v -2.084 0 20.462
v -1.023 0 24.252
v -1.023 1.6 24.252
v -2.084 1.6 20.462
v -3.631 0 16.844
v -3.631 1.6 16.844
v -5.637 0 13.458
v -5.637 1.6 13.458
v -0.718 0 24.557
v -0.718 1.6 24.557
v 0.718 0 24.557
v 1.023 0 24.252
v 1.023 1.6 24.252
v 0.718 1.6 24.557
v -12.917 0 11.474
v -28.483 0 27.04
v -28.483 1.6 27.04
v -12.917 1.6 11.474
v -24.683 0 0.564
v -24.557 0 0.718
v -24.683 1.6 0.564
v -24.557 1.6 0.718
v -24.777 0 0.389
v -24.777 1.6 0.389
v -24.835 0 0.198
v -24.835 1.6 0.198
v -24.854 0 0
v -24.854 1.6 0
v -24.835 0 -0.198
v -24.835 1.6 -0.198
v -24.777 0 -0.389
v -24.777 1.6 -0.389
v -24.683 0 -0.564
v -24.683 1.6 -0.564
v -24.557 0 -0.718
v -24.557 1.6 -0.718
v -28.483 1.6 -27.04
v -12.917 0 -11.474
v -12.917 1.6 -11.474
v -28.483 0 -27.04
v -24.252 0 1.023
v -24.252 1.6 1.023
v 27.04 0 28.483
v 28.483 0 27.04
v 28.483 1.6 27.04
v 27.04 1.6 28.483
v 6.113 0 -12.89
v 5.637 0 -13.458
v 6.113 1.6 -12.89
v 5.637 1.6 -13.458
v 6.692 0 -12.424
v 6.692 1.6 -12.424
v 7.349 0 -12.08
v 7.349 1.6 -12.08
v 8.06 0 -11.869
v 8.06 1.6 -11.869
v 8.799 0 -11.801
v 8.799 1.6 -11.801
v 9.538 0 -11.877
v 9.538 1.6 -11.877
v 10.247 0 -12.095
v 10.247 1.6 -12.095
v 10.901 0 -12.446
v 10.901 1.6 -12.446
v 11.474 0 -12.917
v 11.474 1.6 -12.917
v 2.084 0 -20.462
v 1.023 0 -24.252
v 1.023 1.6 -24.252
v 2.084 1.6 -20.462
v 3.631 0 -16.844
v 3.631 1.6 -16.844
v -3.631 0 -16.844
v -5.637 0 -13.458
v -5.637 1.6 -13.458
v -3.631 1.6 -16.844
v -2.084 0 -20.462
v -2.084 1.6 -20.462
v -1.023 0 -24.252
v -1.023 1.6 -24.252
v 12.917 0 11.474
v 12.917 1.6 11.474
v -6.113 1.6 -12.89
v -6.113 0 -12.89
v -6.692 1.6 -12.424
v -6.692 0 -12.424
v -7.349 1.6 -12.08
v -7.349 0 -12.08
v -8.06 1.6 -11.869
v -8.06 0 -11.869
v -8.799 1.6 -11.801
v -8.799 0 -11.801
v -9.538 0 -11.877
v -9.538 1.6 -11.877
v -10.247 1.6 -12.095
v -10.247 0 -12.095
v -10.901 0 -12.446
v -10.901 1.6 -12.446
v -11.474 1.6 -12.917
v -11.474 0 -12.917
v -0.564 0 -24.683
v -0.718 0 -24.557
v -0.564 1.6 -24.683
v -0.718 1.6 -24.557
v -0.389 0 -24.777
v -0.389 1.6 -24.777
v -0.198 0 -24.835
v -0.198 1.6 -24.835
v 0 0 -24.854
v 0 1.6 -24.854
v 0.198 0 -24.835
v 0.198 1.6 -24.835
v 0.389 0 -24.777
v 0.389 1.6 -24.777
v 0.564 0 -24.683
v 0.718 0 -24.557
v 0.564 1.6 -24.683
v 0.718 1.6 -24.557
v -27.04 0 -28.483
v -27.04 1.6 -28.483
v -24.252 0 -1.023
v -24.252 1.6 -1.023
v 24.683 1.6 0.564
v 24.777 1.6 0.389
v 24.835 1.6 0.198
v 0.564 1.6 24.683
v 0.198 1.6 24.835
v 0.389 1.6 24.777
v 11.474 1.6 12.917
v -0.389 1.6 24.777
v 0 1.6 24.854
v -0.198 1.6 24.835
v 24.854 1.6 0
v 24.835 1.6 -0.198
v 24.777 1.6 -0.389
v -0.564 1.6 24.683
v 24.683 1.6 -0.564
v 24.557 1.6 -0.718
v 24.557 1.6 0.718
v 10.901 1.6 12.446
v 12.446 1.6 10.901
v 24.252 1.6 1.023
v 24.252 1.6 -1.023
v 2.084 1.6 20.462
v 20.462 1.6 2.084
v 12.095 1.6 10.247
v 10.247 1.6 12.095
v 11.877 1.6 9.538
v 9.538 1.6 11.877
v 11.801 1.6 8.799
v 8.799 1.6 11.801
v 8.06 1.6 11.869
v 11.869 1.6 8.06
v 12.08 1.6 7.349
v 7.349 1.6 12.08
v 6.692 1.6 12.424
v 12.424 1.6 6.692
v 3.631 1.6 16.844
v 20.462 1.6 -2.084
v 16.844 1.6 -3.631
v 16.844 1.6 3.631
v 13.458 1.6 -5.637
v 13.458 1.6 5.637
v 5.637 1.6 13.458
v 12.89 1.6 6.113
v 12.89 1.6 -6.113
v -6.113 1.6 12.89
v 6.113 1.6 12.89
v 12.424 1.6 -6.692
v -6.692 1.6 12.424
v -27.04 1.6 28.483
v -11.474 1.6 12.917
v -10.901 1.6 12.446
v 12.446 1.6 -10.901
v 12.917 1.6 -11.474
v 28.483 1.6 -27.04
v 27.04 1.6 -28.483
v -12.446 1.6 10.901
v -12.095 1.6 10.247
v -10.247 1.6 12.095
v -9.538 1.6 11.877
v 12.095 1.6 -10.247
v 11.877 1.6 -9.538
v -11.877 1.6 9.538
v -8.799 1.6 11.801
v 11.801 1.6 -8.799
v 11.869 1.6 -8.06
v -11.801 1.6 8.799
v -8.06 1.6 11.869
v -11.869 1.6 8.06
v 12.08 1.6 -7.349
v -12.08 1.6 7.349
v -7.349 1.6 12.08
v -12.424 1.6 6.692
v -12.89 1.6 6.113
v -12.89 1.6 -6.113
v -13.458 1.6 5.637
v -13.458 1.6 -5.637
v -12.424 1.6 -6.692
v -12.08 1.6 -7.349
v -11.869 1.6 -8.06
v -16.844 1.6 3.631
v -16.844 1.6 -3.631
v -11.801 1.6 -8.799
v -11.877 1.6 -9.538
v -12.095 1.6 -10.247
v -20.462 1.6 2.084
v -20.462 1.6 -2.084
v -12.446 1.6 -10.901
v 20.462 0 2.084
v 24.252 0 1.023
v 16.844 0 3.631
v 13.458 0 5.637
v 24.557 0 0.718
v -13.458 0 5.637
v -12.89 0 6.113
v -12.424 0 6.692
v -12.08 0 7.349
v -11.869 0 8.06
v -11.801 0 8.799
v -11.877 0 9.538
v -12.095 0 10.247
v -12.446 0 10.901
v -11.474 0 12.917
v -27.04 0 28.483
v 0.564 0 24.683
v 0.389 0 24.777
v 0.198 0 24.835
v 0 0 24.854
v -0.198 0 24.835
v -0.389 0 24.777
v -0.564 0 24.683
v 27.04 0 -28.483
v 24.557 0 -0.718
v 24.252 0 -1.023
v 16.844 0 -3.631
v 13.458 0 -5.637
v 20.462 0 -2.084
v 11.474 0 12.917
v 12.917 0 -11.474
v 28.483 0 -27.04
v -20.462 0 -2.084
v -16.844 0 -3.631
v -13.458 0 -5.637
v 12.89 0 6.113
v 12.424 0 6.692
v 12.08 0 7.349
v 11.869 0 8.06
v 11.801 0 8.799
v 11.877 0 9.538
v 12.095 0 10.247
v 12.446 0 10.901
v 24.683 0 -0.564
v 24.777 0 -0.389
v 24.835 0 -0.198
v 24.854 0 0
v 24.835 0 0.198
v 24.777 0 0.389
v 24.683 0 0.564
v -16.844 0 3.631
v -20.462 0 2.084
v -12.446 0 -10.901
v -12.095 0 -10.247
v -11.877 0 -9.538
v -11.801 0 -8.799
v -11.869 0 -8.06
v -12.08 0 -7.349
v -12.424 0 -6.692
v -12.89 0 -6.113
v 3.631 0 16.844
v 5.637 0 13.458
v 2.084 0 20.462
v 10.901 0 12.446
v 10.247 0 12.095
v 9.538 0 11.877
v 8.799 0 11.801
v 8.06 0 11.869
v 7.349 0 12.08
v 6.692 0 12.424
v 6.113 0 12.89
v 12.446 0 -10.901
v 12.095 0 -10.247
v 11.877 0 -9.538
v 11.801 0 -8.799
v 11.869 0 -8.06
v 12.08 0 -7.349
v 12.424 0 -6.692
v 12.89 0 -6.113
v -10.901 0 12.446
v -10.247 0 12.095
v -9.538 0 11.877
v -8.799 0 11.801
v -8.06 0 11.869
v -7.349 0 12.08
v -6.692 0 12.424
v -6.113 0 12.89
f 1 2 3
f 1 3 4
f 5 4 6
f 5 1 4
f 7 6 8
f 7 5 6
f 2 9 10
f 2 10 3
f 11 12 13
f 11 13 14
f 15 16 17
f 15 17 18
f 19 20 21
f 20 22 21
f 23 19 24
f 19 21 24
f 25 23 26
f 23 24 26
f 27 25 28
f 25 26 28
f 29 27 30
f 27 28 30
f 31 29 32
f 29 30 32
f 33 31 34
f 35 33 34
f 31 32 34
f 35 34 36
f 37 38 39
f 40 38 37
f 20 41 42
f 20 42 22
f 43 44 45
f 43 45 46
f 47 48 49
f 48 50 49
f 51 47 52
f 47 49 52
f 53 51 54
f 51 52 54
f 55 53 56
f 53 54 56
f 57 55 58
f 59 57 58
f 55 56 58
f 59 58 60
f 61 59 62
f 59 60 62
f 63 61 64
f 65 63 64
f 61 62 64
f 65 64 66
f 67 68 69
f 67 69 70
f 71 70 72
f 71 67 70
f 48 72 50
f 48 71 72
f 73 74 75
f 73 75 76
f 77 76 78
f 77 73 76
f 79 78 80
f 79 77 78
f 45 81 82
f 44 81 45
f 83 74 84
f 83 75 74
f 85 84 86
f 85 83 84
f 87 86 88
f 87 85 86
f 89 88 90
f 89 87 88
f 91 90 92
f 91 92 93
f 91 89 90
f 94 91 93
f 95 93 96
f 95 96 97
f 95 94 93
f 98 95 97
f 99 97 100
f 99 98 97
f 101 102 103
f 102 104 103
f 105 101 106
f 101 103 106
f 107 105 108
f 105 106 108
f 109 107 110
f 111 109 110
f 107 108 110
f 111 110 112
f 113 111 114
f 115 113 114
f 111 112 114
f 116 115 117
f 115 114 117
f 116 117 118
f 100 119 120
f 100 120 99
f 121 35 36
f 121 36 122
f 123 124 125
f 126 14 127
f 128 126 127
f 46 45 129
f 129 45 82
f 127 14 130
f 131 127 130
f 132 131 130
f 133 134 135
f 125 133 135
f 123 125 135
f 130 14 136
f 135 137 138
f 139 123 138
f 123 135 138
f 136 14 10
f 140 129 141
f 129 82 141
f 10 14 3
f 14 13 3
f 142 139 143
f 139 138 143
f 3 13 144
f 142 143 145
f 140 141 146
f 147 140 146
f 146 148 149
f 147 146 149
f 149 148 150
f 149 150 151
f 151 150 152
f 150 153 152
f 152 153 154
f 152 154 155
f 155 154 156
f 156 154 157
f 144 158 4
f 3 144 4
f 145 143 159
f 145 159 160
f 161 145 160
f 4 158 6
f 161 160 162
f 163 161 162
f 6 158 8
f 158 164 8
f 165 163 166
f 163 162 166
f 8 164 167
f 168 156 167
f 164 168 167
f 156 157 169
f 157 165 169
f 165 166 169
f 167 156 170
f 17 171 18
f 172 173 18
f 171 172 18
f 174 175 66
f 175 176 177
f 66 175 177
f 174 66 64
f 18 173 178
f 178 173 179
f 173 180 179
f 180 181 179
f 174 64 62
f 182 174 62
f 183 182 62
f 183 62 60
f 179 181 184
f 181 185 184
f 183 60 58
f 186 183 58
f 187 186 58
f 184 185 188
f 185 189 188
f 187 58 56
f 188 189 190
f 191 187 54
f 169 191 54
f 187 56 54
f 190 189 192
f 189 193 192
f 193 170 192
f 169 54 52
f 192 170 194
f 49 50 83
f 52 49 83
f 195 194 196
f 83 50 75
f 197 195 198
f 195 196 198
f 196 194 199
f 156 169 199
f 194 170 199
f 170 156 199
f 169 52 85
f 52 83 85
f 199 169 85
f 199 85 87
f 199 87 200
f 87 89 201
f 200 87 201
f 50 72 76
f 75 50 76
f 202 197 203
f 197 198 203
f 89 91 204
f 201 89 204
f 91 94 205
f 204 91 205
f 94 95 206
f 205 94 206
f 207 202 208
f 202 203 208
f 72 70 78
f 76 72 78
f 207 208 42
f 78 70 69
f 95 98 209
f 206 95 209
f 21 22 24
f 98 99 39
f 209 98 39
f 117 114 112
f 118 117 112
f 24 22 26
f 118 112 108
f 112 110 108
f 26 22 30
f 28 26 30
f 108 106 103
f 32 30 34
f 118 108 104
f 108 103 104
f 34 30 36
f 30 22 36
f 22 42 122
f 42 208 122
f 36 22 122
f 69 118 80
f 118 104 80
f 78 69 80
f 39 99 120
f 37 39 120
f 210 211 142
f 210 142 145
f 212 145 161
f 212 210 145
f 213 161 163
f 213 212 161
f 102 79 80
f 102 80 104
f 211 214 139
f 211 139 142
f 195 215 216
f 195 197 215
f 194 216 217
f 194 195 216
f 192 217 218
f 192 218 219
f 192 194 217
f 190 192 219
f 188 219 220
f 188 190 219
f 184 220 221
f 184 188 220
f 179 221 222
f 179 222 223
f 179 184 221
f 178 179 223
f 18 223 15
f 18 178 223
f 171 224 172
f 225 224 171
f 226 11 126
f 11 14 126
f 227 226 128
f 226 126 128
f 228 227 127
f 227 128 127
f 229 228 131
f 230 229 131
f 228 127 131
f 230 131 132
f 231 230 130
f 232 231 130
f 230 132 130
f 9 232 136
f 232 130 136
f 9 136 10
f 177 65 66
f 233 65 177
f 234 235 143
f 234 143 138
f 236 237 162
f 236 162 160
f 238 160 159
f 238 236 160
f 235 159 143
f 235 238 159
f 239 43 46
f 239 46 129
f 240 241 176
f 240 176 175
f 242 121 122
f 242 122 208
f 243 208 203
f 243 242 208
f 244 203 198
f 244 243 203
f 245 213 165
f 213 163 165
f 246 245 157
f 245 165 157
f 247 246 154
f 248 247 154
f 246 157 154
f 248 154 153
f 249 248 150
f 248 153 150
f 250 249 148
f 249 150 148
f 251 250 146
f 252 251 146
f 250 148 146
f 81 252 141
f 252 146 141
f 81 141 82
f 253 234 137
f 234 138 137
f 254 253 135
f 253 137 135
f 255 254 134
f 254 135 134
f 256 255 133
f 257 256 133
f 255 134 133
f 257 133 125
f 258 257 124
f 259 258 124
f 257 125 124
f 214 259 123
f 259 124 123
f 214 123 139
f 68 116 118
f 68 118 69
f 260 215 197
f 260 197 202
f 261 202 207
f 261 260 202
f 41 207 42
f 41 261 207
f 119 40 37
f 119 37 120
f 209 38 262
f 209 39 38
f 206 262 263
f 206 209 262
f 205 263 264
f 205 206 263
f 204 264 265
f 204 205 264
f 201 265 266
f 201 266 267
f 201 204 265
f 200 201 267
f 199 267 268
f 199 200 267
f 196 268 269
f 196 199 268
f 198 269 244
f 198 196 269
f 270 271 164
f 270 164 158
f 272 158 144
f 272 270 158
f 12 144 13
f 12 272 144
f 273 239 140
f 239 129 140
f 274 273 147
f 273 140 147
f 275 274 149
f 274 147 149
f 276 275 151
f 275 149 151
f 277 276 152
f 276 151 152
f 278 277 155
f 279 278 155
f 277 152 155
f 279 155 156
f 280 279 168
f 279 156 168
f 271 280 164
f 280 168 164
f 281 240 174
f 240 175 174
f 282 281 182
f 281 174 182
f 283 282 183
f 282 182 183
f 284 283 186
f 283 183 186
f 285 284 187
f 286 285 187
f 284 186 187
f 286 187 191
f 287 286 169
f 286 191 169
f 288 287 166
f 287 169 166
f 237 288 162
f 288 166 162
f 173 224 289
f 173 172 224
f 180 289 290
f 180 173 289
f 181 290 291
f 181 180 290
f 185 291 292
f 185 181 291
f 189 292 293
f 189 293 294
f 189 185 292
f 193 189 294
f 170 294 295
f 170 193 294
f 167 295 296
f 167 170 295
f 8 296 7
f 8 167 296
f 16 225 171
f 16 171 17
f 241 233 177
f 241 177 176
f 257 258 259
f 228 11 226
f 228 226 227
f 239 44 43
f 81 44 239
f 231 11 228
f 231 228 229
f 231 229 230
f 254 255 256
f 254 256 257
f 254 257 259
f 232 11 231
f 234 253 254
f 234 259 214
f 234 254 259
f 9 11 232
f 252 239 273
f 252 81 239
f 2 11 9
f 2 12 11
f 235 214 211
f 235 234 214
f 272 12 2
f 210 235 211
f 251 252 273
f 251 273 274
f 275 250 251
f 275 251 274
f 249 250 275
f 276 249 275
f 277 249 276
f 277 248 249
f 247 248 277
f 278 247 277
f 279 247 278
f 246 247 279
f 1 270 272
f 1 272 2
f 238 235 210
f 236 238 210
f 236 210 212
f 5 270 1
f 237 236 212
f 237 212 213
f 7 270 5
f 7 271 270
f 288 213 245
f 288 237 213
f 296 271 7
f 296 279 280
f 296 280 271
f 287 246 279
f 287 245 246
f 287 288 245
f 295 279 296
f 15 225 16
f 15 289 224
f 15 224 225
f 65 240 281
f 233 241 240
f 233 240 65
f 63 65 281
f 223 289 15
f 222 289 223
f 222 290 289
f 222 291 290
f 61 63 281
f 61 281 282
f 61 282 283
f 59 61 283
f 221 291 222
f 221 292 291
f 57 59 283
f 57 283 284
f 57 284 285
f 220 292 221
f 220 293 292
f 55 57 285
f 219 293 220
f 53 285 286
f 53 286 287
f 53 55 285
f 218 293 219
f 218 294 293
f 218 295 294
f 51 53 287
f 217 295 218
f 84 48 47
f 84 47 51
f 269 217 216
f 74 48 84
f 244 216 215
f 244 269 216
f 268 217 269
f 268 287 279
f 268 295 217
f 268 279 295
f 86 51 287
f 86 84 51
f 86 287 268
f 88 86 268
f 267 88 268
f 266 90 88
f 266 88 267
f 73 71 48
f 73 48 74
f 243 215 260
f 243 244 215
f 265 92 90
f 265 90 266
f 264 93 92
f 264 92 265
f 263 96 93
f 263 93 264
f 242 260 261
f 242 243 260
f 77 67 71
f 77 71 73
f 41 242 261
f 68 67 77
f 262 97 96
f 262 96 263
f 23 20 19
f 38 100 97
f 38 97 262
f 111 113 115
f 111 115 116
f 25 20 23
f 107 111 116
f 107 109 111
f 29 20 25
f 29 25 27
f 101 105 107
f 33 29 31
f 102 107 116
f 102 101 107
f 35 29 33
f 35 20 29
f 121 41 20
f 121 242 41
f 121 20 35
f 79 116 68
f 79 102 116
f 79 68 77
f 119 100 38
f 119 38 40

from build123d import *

# Parameters (mm, degrees)
BOSS_EXTRUDE1_DEPTH = 1.6
FILLET1_R           = 1.016
FILLET3_R           = 3.81


with BuildPart() as part:
    # Framesketch → Boss-Extrude1 (new body)
    with BuildSketch(Plane(origin=(0, 0, 0), x_dir=(1, 0, 0), z_dir=(0, 1, 0))):
        with BuildLine():
            Line((-27.040136119, 28.482633953), (-8.475620882, 9.918118716))
            ThreePointArc((-8.475620882, 9.918118716), (-3.768551726, 16.575119627), (-1.023018488, 24.251981512))
            Line((-1.023018488, 24.251981512), (0, 25.275))
            Line((0, 25.275), (1.023018488, 24.251981512))
            ThreePointArc((1.023018488, 24.251981512), (3.768551726, 16.575119627), (8.475620882, 9.918118716))
            Line((8.475620882, 9.918118716), (27.040136119, 28.482633953))
            Line((27.040136119, 28.482633953), (28.482633953, 27.040136119))
            Line((28.482633953, 27.040136119), (9.918118716, 8.475620882))
            ThreePointArc((9.918118716, 8.475620882), (16.575119627, 3.768551726), (24.251981512, 1.023018488))
            Line((24.251981512, 1.023018488), (25.275, 0))
            Line((25.275, 0), (24.251981512, -1.023018488))
            ThreePointArc((24.251981512, -1.023018488), (16.575119627, -3.768551726), (9.918118716, -8.475620882))
            Line((9.918118716, -8.475620882), (28.482633953, -27.040136119))
            Line((28.482633953, -27.040136119), (27.040136119, -28.482633953))
            Line((27.040136119, -28.482633953), (8.475620882, -9.918118716))
            ThreePointArc((8.475620882, -9.918118716), (3.768551726, -16.575119627), (1.023018488, -24.251981512))
            Line((1.023018488, -24.251981512), (0, -25.275))
            Line((0, -25.275), (-1.023018488, -24.251981512))
            ThreePointArc((-1.023018488, -24.251981512), (-3.768551726, -16.575119627), (-8.475620882, -9.918118716))
            Line((-8.475620882, -9.918118716), (-27.040136119, -28.482633953))
            Line((-27.040136119, -28.482633953), (-28.482633953, -27.040136119))
            Line((-28.482633953, -27.040136119), (-9.918118716, -8.475620882))
            ThreePointArc((-9.918118716, -8.475620882), (-16.575119627, -3.768551726), (-24.251981512, -1.023018488))
            Line((-24.251981512, -1.023018488), (-25.275, 0))
            Line((-25.275, 0), (-24.251981512, 1.023018488))
            ThreePointArc((-24.251981512, 1.023018488), (-16.575119627, 3.768551726), (-9.918118716, 8.475620882))
            Line((-9.918118716, 8.475620882), (-28.482633953, 27.040136119))
            Line((-28.482633953, 27.040136119), (-27.040136119, 28.482633953))
        make_face()
    extrude(amount=BOSS_EXTRUDE1_DEPTH)

    # Fillet1
    fillet1_edges = [part.edges().sort_by_distance(p)[0] for p in [
        (-25.275, 0.8, 0),
        (0, 0.8, -25.275),
        (25.275, 0.8, 0),
        (0, 0.8, 25.275),
    ]]
    fillet(fillet1_edges, radius=FILLET1_R)

    # Fillet3
    fillet3_edges = [part.edges().sort_by_distance(p)[0] for p in [
        (-8.475620882, 0.8, 9.918118716),
        (-9.918118716, 0.8, 8.475620882),
        (-9.918118716, 0.8, -8.475620882),
        (-8.475620882, 0.8, -9.918118716),
        (8.475620882, 0.8, -9.918118716),
        (9.918118716, 0.8, -8.475620882),
        (9.918118716, 0.8, 8.475620882),
        (8.475620882, 0.8, 9.918118716),
    ]]
    fillet(fillet3_edges, radius=FILLET3_R)


solid = part.part
